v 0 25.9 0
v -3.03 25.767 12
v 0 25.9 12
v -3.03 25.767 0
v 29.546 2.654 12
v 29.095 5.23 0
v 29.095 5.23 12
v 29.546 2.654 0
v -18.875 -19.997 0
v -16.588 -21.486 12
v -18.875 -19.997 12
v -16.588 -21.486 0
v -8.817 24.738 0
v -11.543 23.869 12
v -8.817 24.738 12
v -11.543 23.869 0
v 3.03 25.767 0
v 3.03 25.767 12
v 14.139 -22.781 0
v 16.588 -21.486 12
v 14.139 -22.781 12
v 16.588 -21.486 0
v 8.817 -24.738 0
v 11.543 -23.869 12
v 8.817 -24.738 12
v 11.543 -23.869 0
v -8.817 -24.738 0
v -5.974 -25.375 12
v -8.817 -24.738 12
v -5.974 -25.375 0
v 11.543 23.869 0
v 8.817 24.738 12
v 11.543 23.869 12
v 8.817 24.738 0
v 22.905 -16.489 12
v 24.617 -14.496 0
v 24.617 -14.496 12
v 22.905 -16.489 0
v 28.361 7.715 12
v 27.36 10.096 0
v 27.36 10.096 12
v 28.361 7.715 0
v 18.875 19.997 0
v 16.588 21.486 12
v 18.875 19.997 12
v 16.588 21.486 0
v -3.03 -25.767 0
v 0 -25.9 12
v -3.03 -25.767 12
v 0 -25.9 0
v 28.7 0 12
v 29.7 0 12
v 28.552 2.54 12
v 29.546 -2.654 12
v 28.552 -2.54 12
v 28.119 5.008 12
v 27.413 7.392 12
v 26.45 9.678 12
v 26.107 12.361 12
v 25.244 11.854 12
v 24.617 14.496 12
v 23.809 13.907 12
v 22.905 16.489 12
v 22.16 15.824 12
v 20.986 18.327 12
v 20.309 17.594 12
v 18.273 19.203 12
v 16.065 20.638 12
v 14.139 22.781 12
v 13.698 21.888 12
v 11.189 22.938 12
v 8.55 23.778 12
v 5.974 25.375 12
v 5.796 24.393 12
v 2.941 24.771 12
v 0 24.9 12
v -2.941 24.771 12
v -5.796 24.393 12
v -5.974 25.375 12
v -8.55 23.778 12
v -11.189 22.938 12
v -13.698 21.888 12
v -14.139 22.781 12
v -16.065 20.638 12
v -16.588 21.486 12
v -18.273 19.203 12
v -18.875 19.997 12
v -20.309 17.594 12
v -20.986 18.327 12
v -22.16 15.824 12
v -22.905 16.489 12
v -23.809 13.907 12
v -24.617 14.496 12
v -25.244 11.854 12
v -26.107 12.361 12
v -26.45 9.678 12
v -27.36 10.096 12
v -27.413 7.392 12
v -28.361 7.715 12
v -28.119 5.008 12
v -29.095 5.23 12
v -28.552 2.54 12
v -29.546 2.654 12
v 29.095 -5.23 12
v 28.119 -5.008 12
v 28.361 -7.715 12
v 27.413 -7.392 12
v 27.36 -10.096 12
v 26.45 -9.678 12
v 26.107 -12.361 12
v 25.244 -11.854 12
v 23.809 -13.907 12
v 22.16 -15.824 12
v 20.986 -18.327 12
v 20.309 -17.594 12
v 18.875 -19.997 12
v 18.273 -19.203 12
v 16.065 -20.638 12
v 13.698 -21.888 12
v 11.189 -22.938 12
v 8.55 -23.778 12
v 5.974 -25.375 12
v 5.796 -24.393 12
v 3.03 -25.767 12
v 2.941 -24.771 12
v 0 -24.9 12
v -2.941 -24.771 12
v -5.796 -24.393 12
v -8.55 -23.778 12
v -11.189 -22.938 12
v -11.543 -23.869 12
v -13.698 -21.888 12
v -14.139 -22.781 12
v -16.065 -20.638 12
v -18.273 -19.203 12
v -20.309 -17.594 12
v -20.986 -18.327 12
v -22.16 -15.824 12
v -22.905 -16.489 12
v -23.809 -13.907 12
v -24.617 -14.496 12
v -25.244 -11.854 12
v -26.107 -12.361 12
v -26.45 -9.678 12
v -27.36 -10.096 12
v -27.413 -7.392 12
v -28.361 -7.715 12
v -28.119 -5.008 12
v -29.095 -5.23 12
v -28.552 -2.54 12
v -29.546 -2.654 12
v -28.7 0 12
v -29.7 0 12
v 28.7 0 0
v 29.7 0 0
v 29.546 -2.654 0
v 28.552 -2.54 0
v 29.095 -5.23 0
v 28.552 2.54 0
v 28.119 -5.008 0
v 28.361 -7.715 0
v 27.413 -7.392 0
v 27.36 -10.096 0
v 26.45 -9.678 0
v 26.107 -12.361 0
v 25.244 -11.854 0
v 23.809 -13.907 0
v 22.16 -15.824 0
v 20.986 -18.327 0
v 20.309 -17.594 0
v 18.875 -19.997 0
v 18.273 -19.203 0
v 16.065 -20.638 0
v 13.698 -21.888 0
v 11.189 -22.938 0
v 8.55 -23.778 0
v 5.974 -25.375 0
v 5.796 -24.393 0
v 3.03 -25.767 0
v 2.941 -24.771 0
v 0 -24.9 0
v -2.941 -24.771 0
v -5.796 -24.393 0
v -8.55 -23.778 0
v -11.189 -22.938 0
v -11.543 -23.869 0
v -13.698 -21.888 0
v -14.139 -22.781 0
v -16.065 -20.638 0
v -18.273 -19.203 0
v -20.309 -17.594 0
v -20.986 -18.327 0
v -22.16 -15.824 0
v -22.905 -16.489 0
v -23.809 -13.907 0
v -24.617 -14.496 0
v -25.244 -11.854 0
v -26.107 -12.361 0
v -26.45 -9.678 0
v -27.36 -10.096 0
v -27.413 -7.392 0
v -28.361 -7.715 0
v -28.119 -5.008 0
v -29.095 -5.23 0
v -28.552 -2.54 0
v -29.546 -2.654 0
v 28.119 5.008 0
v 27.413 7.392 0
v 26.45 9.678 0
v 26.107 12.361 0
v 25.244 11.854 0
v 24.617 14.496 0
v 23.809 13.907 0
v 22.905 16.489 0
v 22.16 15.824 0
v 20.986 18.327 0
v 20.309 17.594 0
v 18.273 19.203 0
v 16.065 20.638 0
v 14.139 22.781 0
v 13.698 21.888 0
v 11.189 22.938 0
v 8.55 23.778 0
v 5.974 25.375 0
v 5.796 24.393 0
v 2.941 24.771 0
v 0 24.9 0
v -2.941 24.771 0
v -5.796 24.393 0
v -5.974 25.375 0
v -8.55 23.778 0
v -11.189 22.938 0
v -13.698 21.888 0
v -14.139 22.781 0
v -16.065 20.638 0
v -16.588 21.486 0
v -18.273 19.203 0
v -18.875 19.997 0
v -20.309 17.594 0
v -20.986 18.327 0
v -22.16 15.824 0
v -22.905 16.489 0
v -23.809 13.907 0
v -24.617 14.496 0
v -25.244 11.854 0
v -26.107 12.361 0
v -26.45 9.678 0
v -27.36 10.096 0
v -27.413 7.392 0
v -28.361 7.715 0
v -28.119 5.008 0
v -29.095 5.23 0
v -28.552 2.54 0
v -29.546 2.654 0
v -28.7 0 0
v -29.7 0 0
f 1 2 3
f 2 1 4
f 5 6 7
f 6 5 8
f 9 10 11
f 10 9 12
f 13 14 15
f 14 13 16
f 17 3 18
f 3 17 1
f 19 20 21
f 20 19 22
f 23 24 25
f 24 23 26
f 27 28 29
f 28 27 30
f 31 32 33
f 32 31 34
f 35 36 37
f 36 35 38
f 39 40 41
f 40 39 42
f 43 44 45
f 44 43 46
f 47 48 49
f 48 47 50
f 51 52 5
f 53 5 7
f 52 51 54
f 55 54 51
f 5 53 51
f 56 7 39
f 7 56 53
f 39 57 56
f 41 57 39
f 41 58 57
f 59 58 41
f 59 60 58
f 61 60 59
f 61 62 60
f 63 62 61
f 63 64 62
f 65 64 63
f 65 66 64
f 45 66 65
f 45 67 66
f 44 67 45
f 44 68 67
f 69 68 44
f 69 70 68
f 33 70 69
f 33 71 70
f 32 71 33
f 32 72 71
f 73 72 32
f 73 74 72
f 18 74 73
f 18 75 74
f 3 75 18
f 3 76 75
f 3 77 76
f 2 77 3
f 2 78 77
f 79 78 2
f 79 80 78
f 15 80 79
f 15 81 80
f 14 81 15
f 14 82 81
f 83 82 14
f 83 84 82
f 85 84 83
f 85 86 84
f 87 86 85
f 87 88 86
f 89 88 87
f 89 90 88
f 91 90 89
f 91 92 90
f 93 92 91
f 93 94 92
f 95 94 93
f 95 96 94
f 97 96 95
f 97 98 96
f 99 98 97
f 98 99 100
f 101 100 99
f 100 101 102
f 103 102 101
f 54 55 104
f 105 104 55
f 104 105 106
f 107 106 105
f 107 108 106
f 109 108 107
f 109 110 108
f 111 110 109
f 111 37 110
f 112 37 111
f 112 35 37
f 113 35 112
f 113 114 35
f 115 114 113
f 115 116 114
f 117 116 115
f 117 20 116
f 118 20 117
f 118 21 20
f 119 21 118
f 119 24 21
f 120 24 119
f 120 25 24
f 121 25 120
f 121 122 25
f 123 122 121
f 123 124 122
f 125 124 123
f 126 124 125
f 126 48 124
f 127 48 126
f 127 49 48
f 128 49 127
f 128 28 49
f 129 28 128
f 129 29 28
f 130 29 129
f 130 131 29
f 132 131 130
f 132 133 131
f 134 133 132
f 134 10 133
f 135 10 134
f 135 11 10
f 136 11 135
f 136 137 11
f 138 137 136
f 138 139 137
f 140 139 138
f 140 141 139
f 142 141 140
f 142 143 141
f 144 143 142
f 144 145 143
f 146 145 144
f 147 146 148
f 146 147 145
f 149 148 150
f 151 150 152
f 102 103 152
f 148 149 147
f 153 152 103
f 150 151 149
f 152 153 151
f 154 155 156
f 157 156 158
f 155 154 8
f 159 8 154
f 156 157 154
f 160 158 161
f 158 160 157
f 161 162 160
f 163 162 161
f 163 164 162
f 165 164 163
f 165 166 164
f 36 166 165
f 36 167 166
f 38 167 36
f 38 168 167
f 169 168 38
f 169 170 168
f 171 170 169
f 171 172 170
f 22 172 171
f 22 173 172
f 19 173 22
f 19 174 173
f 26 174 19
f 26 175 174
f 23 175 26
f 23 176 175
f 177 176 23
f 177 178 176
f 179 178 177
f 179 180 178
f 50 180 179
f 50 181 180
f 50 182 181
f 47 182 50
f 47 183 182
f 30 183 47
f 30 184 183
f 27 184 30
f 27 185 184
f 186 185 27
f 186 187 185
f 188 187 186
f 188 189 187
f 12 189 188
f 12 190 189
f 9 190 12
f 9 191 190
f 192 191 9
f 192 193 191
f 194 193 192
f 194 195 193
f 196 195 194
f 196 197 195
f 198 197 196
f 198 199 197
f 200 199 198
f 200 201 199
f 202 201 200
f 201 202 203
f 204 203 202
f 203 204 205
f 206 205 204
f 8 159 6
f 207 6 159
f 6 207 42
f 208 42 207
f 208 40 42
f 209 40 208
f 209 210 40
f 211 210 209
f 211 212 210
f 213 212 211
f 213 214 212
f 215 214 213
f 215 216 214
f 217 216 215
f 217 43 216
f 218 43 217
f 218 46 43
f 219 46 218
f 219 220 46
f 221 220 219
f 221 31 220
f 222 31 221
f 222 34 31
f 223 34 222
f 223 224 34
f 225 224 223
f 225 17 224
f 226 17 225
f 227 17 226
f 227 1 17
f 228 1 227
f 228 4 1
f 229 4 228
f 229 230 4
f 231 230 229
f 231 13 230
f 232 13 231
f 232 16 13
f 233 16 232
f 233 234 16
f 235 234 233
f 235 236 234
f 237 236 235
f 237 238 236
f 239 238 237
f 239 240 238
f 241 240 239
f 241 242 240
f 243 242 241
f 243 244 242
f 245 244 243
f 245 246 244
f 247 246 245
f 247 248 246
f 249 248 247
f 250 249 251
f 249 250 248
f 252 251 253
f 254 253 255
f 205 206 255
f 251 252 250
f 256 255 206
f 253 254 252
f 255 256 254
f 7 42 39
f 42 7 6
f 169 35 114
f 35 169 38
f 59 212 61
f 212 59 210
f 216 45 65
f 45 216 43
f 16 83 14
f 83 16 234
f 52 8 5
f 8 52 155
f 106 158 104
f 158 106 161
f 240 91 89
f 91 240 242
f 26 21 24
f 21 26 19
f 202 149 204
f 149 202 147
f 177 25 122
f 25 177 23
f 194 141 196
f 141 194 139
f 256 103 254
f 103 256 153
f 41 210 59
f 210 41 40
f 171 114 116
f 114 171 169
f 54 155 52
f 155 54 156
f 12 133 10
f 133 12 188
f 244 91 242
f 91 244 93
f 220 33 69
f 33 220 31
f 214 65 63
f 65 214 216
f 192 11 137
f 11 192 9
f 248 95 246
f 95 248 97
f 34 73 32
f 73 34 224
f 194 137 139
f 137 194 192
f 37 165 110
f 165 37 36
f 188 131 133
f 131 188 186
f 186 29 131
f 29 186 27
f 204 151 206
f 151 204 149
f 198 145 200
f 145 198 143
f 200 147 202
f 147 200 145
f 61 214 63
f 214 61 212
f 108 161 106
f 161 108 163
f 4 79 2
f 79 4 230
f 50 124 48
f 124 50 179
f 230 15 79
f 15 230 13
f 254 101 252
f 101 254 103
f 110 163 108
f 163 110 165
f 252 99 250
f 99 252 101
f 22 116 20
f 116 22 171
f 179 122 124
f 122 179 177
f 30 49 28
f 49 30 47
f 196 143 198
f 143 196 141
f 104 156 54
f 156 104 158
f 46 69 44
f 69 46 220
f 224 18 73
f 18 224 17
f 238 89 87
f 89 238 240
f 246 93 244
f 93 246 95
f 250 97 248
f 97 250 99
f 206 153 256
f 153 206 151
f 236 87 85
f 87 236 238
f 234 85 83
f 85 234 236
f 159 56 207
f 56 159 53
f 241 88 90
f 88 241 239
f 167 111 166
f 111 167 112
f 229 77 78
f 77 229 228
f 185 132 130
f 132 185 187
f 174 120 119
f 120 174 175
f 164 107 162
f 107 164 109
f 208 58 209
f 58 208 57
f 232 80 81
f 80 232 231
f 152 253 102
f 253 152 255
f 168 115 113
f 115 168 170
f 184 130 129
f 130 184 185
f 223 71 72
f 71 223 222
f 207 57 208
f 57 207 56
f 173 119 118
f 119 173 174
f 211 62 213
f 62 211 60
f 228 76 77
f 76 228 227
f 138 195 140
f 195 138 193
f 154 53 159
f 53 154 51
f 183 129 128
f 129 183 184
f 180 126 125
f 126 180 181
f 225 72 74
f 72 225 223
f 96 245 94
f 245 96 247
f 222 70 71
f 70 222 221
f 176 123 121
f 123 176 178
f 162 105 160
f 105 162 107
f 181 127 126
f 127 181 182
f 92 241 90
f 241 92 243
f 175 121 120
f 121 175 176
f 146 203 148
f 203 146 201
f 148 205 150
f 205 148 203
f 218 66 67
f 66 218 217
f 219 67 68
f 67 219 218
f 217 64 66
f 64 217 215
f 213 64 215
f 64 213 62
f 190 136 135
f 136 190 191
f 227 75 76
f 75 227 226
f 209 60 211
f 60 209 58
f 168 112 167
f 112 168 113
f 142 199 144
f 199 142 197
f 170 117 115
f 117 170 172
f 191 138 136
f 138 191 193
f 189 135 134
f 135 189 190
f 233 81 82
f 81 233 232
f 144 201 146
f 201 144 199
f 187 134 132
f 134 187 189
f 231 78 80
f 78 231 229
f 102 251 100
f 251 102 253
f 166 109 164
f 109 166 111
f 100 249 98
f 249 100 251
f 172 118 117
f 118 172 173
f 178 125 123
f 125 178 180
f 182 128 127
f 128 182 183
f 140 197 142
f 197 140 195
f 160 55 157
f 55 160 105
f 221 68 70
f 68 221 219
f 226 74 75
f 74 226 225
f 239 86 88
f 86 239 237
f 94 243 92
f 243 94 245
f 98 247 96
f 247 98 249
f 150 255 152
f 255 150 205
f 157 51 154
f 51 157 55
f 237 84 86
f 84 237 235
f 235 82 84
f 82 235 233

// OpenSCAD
// Module names are of the form poly_<inkscape-path-id>().  As a result,
// you can associate a polygon in this OpenSCAD program with the corresponding
// SVG element in the Inkscape document by looking for the XML element with
// the attribute id="inkscape-path-id".

// fudge value is used to ensure that subtracted solids are a tad taller
// in the z dimension than the polygon being subtracted from.  This helps
// keep the resulting .stl file manifold.
fudge = 0.1;

module poly_path4146(h)
{
  scale([25.4/90, -25.4/90, 1]) union()
  {
    difference()
    {
       linear_extrude(height=h)
         polygon([[-0.000000,-91.771486],[-10.735807,-91.299024],[-21.166984,-89.912034],[-31.239993,-87.656106],[-40.901297,-84.576833],[-50.097359,-80.719807],[-58.774641,-76.130619],[-66.879606,-70.854860],[-74.358716,-64.938123],[-81.158434,-58.425999],[-87.225223,-51.364080],[-92.505544,-43.797957],[-96.945860,-35.773223],[-100.492634,-27.335468],[-103.092329,-18.530285],[-104.691407,-9.403266],[-105.236330,-0.000001],[-104.691407,9.403263],[-103.092329,18.530283],[-100.492634,27.335466],[-96.945860,35.773221],[-92.505544,43.797956],[-87.225223,51.364079],[-81.158434,58.425998],[-74.358716,64.938122],[-66.879606,70.854860],[-58.774641,76.130618],[-50.097359,80.719807],[-40.901297,84.576833],[-31.239993,87.656106],[-21.166984,89.912034],[-10.735807,91.299024],[-0.000000,91.771486],[10.735806,91.299024],[21.166982,89.912034],[31.239991,87.656106],[40.901295,84.576833],[50.097357,80.719807],[58.774639,76.130618],[66.879604,70.854860],[74.358715,64.938122],[81.158433,58.425998],[87.225221,51.364079],[92.505543,43.797956],[96.945859,35.773221],[100.492634,27.335466],[103.092329,18.530283],[104.691407,9.403263],[105.236330,-0.000001],[104.691407,-9.403266],[103.092329,-18.530285],[100.492634,-27.335468],[96.945859,-35.773223],[92.505543,-43.797957],[87.225221,-51.364080],[81.158433,-58.425999],[74.358715,-64.938123],[66.879604,-70.854860],[58.774639,-76.130619],[50.097357,-80.719807],[40.901295,-84.576834],[31.239991,-87.656106],[21.166982,-89.912034],[10.735806,-91.299024],[-0.000000,-91.771486]]);
       translate([0, 0, -fudge])
         linear_extrude(height=h+2*fudge)
           polygon([[-0.000000,-88.228517],[10.421511,-87.771659],[20.536495,-86.431009],[30.294475,-84.251453],[39.644972,-81.277877],[48.537508,-77.555168],[56.921607,-73.128211],[64.746789,-68.041893],[71.962577,-62.341100],[78.518494,-56.070719],[84.364060,-49.275635],[89.448800,-42.000734],[93.722234,-34.290903],[97.133885,-26.191028],[99.633274,-17.745996],[101.169925,-9.000691],[101.693360,-0.000001],[101.169925,9.000688],[99.633274,17.745992],[97.133885,26.191025],[93.722234,34.290900],[89.448800,42.000730],[84.364060,49.275631],[78.518494,56.070715],[71.962577,62.341097],[64.746789,68.041890],[56.921607,73.128208],[48.537508,77.555165],[39.644972,81.277875],[30.294475,84.251451],[20.536495,86.431007],[10.421511,87.771657],[-0.000000,88.228516],[-10.421512,87.771657],[-20.536497,86.431007],[-30.294477,84.251451],[-39.644975,81.277875],[-48.537511,77.555165],[-56.921610,73.128208],[-64.746792,68.041890],[-71.962580,62.341097],[-78.518496,56.070715],[-84.364063,49.275631],[-89.448802,42.000730],[-93.722236,34.290900],[-97.133886,26.191025],[-99.633276,17.745992],[-101.169927,9.000688],[-101.693361,-0.000001],[-101.169927,-9.000691],[-99.633276,-17.745996],[-97.133886,-26.191028],[-93.722236,-34.290903],[-89.448802,-42.000734],[-84.364063,-49.275635],[-78.518496,-56.070719],[-71.962580,-62.341100],[-64.746792,-68.041893],[-56.921610,-73.128211],[-48.537511,-77.555168],[-39.644975,-81.277877],[-30.294477,-84.251453],[-20.536497,-86.431009],[-10.421512,-87.771659],[-0.000000,-88.228517]]);
    }
  }
}

poly_path4146(12);
